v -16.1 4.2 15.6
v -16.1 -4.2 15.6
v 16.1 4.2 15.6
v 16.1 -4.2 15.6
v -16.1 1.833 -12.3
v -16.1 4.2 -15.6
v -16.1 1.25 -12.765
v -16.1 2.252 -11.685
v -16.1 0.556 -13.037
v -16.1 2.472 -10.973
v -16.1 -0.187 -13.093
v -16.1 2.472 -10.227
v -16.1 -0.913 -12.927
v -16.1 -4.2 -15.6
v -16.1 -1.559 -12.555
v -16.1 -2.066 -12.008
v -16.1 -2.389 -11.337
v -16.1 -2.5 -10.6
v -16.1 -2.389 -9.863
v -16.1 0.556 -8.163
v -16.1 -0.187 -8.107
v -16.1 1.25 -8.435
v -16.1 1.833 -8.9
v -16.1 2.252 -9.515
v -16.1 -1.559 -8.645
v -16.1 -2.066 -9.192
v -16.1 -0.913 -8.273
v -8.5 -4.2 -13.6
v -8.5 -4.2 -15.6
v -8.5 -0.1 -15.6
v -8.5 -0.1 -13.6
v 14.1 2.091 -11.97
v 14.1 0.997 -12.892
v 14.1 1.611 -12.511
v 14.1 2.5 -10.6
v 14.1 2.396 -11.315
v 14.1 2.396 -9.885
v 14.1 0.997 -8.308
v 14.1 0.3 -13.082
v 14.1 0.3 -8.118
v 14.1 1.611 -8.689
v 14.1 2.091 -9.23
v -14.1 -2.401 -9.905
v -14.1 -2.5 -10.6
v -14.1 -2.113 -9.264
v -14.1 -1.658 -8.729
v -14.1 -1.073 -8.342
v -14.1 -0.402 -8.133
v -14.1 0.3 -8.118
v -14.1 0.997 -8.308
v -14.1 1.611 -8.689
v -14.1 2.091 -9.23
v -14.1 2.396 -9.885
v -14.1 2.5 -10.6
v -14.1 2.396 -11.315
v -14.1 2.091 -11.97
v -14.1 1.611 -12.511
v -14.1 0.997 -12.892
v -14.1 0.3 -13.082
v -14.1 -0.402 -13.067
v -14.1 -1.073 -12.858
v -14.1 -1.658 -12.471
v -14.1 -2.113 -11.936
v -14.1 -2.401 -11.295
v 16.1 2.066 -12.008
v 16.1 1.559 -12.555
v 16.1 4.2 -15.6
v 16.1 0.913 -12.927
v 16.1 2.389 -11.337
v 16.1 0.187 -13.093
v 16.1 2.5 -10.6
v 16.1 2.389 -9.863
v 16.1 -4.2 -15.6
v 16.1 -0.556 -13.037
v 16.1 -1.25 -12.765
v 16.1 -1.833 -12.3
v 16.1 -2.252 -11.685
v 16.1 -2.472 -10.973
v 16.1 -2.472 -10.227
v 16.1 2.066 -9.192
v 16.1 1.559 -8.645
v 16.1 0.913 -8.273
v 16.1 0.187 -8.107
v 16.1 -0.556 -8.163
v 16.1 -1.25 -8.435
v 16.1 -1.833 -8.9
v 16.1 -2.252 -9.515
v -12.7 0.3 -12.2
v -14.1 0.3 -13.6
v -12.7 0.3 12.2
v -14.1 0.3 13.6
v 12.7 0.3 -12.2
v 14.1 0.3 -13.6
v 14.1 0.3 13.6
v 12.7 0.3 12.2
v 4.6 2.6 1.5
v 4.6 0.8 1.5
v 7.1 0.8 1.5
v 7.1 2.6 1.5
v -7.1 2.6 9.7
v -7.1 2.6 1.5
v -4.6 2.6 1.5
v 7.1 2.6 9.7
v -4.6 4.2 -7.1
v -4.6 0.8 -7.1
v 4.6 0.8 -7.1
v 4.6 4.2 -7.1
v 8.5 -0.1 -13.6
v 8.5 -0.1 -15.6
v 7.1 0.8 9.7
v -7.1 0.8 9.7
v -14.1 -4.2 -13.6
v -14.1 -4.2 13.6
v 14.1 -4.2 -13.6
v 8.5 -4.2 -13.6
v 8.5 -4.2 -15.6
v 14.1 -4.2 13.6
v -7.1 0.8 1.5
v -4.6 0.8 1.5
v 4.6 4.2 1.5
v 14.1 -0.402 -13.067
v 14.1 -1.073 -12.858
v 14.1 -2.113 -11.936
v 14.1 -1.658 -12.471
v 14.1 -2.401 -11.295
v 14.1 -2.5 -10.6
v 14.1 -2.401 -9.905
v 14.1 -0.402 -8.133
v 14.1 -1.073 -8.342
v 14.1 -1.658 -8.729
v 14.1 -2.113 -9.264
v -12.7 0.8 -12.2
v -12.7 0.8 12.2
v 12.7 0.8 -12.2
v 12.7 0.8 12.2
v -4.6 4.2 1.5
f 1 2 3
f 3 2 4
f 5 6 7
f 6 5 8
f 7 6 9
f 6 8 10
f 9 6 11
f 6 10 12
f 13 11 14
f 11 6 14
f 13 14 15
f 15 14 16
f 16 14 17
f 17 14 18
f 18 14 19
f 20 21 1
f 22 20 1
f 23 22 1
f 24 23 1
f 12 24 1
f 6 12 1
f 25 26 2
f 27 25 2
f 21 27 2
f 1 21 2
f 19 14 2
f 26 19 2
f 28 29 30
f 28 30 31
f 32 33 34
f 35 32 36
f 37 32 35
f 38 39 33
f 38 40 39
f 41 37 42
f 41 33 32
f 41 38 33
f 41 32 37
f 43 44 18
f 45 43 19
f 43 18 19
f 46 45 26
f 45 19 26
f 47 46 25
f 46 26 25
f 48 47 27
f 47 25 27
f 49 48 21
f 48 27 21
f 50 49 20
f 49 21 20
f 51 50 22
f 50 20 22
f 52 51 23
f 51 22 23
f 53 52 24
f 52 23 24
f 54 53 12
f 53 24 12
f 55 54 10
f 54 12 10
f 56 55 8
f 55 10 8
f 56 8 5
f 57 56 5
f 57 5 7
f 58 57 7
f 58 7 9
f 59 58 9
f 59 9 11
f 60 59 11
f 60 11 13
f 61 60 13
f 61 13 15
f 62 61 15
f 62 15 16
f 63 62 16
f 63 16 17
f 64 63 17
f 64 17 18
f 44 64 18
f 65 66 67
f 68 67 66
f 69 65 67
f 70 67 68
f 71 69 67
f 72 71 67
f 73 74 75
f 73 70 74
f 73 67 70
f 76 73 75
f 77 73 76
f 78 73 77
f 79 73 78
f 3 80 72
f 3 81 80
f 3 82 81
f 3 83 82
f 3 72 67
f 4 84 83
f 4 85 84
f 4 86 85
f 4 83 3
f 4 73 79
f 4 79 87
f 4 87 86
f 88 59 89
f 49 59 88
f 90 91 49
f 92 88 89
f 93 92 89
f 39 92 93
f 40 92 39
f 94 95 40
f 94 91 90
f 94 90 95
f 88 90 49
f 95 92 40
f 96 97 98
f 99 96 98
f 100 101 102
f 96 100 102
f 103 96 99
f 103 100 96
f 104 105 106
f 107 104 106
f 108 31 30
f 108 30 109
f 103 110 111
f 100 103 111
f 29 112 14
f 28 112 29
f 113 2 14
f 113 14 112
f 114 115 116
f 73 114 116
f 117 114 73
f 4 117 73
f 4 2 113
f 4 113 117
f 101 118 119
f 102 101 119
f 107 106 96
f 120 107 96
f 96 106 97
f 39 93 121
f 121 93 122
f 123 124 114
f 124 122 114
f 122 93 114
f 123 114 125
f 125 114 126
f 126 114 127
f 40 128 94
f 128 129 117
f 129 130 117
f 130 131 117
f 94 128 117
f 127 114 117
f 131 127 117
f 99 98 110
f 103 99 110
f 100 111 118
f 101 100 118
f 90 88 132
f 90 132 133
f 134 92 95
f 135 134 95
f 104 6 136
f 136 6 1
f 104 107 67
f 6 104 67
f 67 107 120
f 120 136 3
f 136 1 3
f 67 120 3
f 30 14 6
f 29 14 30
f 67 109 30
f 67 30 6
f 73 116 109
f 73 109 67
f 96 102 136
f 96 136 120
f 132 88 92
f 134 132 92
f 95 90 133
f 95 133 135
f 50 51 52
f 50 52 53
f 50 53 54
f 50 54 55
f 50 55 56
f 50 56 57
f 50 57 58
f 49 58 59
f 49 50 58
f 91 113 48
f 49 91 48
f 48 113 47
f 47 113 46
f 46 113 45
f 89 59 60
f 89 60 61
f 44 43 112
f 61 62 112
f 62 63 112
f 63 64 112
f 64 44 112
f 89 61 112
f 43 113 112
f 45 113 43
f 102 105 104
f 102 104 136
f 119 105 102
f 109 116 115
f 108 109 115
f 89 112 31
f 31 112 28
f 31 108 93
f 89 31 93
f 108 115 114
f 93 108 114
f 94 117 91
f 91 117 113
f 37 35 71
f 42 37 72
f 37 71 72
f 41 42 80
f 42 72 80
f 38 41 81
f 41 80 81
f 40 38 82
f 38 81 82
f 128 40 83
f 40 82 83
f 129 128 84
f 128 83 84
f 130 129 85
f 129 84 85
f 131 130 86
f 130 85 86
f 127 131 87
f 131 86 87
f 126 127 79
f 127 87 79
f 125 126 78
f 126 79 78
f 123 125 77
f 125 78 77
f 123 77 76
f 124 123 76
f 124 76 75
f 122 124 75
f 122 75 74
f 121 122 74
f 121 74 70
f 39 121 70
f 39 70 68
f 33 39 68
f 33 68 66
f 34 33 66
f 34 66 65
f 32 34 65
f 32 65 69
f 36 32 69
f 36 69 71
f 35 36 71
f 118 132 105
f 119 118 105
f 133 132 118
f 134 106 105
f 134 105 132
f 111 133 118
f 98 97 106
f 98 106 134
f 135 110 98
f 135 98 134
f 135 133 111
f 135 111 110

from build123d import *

# Parameters (mm, degrees)
F0_W      = 32.2
F0_H      = 31.2
F1_DEPTH  = 4.2
F2_W      = 9.2
F2_H      = 8.6
F3_DEPTH  = 8.4
F2_W_2    = 25.4
F2_H_2    = 24.4
F4_DEPTH  = 4.5
F5_DEPTH  = 5
F2_W_3    = 17
F2_H_3    = 2
F6_DEPTH  = 4.1
F7_DEPTH  = 6.8
F8_R      = 2.5
F9_DEPTH  = 2
F10_R     = 2.5
F11_DEPTH = 2


with BuildPart() as f1:
    # F0 (on Front) → F1 (new body, symmetric)
    with BuildSketch(Plane.XZ):
        Rectangle(F0_W, F0_H)
    extrude(amount=F1_DEPTH, both=True)

    # F2 (on face) → F3 (cut, through all)
    with BuildSketch(Plane.XZ.offset(4.2)):
        with Locations((0, -2.8)):
            Rectangle(F2_W, F2_H)
    extrude(amount=-F3_DEPTH, mode=Mode.SUBTRACT)

    # F2 (on face) → F4 (cut)
    with BuildSketch(Plane.XZ.offset(4.2)):
        Polygon((14.1, -13.6), (14.1, 13.6), (-14.1, 13.6), (-14.1, -13.6), (-8.5, -13.6), (8.5, -13.6), align=None)
        Rectangle(F2_W_2, F2_H_2, mode=Mode.SUBTRACT)
    extrude(amount=-F4_DEPTH, mode=Mode.SUBTRACT)

    # F5 (cut): a face of the model
    f5_faces = [f1.faces().sort_by_distance(p)[0] for p in [
        (-12.3477898355, -4.2, 0),
    ]]
    extrude(f5_faces, amount=-F5_DEPTH, mode=Mode.SUBTRACT)

    # F2 (on face) → F6 (cut)
    with BuildSketch(Plane.XZ.offset(4.2)):
        with Locations((0, -14.6)):
            Rectangle(F2_W_3, F2_H_3)
    extrude(amount=-F6_DEPTH, mode=Mode.SUBTRACT)

    # F2 (on face) → F7 (cut)
    with BuildSketch(Plane.XZ.offset(4.2)):
        Polygon((-7.1, 1.5), (-4.6, 1.5), (4.6, 1.5), (7.1, 1.5), (7.1, 9.7), (-7.1, 9.7), align=None)
    extrude(amount=-F7_DEPTH, mode=Mode.SUBTRACT)

    # F8 (on face) → F9 (cut)
    with BuildSketch(Plane.YZ.offset(16.1)):
        with Locations((0, -10.6)):
            Circle(F8_R)
    extrude(amount=-F9_DEPTH, mode=Mode.SUBTRACT)

    # F10 (on face) → F11 (cut)
    with BuildSketch(Plane(origin=(-16.1, 0, 0), x_dir=(0, -1, 0), z_dir=(-1, 0, 0))):
        with Locations((0, -10.6)):
            Circle(F10_R)
    extrude(amount=-F11_DEPTH, mode=Mode.SUBTRACT)


solid = f1.part
